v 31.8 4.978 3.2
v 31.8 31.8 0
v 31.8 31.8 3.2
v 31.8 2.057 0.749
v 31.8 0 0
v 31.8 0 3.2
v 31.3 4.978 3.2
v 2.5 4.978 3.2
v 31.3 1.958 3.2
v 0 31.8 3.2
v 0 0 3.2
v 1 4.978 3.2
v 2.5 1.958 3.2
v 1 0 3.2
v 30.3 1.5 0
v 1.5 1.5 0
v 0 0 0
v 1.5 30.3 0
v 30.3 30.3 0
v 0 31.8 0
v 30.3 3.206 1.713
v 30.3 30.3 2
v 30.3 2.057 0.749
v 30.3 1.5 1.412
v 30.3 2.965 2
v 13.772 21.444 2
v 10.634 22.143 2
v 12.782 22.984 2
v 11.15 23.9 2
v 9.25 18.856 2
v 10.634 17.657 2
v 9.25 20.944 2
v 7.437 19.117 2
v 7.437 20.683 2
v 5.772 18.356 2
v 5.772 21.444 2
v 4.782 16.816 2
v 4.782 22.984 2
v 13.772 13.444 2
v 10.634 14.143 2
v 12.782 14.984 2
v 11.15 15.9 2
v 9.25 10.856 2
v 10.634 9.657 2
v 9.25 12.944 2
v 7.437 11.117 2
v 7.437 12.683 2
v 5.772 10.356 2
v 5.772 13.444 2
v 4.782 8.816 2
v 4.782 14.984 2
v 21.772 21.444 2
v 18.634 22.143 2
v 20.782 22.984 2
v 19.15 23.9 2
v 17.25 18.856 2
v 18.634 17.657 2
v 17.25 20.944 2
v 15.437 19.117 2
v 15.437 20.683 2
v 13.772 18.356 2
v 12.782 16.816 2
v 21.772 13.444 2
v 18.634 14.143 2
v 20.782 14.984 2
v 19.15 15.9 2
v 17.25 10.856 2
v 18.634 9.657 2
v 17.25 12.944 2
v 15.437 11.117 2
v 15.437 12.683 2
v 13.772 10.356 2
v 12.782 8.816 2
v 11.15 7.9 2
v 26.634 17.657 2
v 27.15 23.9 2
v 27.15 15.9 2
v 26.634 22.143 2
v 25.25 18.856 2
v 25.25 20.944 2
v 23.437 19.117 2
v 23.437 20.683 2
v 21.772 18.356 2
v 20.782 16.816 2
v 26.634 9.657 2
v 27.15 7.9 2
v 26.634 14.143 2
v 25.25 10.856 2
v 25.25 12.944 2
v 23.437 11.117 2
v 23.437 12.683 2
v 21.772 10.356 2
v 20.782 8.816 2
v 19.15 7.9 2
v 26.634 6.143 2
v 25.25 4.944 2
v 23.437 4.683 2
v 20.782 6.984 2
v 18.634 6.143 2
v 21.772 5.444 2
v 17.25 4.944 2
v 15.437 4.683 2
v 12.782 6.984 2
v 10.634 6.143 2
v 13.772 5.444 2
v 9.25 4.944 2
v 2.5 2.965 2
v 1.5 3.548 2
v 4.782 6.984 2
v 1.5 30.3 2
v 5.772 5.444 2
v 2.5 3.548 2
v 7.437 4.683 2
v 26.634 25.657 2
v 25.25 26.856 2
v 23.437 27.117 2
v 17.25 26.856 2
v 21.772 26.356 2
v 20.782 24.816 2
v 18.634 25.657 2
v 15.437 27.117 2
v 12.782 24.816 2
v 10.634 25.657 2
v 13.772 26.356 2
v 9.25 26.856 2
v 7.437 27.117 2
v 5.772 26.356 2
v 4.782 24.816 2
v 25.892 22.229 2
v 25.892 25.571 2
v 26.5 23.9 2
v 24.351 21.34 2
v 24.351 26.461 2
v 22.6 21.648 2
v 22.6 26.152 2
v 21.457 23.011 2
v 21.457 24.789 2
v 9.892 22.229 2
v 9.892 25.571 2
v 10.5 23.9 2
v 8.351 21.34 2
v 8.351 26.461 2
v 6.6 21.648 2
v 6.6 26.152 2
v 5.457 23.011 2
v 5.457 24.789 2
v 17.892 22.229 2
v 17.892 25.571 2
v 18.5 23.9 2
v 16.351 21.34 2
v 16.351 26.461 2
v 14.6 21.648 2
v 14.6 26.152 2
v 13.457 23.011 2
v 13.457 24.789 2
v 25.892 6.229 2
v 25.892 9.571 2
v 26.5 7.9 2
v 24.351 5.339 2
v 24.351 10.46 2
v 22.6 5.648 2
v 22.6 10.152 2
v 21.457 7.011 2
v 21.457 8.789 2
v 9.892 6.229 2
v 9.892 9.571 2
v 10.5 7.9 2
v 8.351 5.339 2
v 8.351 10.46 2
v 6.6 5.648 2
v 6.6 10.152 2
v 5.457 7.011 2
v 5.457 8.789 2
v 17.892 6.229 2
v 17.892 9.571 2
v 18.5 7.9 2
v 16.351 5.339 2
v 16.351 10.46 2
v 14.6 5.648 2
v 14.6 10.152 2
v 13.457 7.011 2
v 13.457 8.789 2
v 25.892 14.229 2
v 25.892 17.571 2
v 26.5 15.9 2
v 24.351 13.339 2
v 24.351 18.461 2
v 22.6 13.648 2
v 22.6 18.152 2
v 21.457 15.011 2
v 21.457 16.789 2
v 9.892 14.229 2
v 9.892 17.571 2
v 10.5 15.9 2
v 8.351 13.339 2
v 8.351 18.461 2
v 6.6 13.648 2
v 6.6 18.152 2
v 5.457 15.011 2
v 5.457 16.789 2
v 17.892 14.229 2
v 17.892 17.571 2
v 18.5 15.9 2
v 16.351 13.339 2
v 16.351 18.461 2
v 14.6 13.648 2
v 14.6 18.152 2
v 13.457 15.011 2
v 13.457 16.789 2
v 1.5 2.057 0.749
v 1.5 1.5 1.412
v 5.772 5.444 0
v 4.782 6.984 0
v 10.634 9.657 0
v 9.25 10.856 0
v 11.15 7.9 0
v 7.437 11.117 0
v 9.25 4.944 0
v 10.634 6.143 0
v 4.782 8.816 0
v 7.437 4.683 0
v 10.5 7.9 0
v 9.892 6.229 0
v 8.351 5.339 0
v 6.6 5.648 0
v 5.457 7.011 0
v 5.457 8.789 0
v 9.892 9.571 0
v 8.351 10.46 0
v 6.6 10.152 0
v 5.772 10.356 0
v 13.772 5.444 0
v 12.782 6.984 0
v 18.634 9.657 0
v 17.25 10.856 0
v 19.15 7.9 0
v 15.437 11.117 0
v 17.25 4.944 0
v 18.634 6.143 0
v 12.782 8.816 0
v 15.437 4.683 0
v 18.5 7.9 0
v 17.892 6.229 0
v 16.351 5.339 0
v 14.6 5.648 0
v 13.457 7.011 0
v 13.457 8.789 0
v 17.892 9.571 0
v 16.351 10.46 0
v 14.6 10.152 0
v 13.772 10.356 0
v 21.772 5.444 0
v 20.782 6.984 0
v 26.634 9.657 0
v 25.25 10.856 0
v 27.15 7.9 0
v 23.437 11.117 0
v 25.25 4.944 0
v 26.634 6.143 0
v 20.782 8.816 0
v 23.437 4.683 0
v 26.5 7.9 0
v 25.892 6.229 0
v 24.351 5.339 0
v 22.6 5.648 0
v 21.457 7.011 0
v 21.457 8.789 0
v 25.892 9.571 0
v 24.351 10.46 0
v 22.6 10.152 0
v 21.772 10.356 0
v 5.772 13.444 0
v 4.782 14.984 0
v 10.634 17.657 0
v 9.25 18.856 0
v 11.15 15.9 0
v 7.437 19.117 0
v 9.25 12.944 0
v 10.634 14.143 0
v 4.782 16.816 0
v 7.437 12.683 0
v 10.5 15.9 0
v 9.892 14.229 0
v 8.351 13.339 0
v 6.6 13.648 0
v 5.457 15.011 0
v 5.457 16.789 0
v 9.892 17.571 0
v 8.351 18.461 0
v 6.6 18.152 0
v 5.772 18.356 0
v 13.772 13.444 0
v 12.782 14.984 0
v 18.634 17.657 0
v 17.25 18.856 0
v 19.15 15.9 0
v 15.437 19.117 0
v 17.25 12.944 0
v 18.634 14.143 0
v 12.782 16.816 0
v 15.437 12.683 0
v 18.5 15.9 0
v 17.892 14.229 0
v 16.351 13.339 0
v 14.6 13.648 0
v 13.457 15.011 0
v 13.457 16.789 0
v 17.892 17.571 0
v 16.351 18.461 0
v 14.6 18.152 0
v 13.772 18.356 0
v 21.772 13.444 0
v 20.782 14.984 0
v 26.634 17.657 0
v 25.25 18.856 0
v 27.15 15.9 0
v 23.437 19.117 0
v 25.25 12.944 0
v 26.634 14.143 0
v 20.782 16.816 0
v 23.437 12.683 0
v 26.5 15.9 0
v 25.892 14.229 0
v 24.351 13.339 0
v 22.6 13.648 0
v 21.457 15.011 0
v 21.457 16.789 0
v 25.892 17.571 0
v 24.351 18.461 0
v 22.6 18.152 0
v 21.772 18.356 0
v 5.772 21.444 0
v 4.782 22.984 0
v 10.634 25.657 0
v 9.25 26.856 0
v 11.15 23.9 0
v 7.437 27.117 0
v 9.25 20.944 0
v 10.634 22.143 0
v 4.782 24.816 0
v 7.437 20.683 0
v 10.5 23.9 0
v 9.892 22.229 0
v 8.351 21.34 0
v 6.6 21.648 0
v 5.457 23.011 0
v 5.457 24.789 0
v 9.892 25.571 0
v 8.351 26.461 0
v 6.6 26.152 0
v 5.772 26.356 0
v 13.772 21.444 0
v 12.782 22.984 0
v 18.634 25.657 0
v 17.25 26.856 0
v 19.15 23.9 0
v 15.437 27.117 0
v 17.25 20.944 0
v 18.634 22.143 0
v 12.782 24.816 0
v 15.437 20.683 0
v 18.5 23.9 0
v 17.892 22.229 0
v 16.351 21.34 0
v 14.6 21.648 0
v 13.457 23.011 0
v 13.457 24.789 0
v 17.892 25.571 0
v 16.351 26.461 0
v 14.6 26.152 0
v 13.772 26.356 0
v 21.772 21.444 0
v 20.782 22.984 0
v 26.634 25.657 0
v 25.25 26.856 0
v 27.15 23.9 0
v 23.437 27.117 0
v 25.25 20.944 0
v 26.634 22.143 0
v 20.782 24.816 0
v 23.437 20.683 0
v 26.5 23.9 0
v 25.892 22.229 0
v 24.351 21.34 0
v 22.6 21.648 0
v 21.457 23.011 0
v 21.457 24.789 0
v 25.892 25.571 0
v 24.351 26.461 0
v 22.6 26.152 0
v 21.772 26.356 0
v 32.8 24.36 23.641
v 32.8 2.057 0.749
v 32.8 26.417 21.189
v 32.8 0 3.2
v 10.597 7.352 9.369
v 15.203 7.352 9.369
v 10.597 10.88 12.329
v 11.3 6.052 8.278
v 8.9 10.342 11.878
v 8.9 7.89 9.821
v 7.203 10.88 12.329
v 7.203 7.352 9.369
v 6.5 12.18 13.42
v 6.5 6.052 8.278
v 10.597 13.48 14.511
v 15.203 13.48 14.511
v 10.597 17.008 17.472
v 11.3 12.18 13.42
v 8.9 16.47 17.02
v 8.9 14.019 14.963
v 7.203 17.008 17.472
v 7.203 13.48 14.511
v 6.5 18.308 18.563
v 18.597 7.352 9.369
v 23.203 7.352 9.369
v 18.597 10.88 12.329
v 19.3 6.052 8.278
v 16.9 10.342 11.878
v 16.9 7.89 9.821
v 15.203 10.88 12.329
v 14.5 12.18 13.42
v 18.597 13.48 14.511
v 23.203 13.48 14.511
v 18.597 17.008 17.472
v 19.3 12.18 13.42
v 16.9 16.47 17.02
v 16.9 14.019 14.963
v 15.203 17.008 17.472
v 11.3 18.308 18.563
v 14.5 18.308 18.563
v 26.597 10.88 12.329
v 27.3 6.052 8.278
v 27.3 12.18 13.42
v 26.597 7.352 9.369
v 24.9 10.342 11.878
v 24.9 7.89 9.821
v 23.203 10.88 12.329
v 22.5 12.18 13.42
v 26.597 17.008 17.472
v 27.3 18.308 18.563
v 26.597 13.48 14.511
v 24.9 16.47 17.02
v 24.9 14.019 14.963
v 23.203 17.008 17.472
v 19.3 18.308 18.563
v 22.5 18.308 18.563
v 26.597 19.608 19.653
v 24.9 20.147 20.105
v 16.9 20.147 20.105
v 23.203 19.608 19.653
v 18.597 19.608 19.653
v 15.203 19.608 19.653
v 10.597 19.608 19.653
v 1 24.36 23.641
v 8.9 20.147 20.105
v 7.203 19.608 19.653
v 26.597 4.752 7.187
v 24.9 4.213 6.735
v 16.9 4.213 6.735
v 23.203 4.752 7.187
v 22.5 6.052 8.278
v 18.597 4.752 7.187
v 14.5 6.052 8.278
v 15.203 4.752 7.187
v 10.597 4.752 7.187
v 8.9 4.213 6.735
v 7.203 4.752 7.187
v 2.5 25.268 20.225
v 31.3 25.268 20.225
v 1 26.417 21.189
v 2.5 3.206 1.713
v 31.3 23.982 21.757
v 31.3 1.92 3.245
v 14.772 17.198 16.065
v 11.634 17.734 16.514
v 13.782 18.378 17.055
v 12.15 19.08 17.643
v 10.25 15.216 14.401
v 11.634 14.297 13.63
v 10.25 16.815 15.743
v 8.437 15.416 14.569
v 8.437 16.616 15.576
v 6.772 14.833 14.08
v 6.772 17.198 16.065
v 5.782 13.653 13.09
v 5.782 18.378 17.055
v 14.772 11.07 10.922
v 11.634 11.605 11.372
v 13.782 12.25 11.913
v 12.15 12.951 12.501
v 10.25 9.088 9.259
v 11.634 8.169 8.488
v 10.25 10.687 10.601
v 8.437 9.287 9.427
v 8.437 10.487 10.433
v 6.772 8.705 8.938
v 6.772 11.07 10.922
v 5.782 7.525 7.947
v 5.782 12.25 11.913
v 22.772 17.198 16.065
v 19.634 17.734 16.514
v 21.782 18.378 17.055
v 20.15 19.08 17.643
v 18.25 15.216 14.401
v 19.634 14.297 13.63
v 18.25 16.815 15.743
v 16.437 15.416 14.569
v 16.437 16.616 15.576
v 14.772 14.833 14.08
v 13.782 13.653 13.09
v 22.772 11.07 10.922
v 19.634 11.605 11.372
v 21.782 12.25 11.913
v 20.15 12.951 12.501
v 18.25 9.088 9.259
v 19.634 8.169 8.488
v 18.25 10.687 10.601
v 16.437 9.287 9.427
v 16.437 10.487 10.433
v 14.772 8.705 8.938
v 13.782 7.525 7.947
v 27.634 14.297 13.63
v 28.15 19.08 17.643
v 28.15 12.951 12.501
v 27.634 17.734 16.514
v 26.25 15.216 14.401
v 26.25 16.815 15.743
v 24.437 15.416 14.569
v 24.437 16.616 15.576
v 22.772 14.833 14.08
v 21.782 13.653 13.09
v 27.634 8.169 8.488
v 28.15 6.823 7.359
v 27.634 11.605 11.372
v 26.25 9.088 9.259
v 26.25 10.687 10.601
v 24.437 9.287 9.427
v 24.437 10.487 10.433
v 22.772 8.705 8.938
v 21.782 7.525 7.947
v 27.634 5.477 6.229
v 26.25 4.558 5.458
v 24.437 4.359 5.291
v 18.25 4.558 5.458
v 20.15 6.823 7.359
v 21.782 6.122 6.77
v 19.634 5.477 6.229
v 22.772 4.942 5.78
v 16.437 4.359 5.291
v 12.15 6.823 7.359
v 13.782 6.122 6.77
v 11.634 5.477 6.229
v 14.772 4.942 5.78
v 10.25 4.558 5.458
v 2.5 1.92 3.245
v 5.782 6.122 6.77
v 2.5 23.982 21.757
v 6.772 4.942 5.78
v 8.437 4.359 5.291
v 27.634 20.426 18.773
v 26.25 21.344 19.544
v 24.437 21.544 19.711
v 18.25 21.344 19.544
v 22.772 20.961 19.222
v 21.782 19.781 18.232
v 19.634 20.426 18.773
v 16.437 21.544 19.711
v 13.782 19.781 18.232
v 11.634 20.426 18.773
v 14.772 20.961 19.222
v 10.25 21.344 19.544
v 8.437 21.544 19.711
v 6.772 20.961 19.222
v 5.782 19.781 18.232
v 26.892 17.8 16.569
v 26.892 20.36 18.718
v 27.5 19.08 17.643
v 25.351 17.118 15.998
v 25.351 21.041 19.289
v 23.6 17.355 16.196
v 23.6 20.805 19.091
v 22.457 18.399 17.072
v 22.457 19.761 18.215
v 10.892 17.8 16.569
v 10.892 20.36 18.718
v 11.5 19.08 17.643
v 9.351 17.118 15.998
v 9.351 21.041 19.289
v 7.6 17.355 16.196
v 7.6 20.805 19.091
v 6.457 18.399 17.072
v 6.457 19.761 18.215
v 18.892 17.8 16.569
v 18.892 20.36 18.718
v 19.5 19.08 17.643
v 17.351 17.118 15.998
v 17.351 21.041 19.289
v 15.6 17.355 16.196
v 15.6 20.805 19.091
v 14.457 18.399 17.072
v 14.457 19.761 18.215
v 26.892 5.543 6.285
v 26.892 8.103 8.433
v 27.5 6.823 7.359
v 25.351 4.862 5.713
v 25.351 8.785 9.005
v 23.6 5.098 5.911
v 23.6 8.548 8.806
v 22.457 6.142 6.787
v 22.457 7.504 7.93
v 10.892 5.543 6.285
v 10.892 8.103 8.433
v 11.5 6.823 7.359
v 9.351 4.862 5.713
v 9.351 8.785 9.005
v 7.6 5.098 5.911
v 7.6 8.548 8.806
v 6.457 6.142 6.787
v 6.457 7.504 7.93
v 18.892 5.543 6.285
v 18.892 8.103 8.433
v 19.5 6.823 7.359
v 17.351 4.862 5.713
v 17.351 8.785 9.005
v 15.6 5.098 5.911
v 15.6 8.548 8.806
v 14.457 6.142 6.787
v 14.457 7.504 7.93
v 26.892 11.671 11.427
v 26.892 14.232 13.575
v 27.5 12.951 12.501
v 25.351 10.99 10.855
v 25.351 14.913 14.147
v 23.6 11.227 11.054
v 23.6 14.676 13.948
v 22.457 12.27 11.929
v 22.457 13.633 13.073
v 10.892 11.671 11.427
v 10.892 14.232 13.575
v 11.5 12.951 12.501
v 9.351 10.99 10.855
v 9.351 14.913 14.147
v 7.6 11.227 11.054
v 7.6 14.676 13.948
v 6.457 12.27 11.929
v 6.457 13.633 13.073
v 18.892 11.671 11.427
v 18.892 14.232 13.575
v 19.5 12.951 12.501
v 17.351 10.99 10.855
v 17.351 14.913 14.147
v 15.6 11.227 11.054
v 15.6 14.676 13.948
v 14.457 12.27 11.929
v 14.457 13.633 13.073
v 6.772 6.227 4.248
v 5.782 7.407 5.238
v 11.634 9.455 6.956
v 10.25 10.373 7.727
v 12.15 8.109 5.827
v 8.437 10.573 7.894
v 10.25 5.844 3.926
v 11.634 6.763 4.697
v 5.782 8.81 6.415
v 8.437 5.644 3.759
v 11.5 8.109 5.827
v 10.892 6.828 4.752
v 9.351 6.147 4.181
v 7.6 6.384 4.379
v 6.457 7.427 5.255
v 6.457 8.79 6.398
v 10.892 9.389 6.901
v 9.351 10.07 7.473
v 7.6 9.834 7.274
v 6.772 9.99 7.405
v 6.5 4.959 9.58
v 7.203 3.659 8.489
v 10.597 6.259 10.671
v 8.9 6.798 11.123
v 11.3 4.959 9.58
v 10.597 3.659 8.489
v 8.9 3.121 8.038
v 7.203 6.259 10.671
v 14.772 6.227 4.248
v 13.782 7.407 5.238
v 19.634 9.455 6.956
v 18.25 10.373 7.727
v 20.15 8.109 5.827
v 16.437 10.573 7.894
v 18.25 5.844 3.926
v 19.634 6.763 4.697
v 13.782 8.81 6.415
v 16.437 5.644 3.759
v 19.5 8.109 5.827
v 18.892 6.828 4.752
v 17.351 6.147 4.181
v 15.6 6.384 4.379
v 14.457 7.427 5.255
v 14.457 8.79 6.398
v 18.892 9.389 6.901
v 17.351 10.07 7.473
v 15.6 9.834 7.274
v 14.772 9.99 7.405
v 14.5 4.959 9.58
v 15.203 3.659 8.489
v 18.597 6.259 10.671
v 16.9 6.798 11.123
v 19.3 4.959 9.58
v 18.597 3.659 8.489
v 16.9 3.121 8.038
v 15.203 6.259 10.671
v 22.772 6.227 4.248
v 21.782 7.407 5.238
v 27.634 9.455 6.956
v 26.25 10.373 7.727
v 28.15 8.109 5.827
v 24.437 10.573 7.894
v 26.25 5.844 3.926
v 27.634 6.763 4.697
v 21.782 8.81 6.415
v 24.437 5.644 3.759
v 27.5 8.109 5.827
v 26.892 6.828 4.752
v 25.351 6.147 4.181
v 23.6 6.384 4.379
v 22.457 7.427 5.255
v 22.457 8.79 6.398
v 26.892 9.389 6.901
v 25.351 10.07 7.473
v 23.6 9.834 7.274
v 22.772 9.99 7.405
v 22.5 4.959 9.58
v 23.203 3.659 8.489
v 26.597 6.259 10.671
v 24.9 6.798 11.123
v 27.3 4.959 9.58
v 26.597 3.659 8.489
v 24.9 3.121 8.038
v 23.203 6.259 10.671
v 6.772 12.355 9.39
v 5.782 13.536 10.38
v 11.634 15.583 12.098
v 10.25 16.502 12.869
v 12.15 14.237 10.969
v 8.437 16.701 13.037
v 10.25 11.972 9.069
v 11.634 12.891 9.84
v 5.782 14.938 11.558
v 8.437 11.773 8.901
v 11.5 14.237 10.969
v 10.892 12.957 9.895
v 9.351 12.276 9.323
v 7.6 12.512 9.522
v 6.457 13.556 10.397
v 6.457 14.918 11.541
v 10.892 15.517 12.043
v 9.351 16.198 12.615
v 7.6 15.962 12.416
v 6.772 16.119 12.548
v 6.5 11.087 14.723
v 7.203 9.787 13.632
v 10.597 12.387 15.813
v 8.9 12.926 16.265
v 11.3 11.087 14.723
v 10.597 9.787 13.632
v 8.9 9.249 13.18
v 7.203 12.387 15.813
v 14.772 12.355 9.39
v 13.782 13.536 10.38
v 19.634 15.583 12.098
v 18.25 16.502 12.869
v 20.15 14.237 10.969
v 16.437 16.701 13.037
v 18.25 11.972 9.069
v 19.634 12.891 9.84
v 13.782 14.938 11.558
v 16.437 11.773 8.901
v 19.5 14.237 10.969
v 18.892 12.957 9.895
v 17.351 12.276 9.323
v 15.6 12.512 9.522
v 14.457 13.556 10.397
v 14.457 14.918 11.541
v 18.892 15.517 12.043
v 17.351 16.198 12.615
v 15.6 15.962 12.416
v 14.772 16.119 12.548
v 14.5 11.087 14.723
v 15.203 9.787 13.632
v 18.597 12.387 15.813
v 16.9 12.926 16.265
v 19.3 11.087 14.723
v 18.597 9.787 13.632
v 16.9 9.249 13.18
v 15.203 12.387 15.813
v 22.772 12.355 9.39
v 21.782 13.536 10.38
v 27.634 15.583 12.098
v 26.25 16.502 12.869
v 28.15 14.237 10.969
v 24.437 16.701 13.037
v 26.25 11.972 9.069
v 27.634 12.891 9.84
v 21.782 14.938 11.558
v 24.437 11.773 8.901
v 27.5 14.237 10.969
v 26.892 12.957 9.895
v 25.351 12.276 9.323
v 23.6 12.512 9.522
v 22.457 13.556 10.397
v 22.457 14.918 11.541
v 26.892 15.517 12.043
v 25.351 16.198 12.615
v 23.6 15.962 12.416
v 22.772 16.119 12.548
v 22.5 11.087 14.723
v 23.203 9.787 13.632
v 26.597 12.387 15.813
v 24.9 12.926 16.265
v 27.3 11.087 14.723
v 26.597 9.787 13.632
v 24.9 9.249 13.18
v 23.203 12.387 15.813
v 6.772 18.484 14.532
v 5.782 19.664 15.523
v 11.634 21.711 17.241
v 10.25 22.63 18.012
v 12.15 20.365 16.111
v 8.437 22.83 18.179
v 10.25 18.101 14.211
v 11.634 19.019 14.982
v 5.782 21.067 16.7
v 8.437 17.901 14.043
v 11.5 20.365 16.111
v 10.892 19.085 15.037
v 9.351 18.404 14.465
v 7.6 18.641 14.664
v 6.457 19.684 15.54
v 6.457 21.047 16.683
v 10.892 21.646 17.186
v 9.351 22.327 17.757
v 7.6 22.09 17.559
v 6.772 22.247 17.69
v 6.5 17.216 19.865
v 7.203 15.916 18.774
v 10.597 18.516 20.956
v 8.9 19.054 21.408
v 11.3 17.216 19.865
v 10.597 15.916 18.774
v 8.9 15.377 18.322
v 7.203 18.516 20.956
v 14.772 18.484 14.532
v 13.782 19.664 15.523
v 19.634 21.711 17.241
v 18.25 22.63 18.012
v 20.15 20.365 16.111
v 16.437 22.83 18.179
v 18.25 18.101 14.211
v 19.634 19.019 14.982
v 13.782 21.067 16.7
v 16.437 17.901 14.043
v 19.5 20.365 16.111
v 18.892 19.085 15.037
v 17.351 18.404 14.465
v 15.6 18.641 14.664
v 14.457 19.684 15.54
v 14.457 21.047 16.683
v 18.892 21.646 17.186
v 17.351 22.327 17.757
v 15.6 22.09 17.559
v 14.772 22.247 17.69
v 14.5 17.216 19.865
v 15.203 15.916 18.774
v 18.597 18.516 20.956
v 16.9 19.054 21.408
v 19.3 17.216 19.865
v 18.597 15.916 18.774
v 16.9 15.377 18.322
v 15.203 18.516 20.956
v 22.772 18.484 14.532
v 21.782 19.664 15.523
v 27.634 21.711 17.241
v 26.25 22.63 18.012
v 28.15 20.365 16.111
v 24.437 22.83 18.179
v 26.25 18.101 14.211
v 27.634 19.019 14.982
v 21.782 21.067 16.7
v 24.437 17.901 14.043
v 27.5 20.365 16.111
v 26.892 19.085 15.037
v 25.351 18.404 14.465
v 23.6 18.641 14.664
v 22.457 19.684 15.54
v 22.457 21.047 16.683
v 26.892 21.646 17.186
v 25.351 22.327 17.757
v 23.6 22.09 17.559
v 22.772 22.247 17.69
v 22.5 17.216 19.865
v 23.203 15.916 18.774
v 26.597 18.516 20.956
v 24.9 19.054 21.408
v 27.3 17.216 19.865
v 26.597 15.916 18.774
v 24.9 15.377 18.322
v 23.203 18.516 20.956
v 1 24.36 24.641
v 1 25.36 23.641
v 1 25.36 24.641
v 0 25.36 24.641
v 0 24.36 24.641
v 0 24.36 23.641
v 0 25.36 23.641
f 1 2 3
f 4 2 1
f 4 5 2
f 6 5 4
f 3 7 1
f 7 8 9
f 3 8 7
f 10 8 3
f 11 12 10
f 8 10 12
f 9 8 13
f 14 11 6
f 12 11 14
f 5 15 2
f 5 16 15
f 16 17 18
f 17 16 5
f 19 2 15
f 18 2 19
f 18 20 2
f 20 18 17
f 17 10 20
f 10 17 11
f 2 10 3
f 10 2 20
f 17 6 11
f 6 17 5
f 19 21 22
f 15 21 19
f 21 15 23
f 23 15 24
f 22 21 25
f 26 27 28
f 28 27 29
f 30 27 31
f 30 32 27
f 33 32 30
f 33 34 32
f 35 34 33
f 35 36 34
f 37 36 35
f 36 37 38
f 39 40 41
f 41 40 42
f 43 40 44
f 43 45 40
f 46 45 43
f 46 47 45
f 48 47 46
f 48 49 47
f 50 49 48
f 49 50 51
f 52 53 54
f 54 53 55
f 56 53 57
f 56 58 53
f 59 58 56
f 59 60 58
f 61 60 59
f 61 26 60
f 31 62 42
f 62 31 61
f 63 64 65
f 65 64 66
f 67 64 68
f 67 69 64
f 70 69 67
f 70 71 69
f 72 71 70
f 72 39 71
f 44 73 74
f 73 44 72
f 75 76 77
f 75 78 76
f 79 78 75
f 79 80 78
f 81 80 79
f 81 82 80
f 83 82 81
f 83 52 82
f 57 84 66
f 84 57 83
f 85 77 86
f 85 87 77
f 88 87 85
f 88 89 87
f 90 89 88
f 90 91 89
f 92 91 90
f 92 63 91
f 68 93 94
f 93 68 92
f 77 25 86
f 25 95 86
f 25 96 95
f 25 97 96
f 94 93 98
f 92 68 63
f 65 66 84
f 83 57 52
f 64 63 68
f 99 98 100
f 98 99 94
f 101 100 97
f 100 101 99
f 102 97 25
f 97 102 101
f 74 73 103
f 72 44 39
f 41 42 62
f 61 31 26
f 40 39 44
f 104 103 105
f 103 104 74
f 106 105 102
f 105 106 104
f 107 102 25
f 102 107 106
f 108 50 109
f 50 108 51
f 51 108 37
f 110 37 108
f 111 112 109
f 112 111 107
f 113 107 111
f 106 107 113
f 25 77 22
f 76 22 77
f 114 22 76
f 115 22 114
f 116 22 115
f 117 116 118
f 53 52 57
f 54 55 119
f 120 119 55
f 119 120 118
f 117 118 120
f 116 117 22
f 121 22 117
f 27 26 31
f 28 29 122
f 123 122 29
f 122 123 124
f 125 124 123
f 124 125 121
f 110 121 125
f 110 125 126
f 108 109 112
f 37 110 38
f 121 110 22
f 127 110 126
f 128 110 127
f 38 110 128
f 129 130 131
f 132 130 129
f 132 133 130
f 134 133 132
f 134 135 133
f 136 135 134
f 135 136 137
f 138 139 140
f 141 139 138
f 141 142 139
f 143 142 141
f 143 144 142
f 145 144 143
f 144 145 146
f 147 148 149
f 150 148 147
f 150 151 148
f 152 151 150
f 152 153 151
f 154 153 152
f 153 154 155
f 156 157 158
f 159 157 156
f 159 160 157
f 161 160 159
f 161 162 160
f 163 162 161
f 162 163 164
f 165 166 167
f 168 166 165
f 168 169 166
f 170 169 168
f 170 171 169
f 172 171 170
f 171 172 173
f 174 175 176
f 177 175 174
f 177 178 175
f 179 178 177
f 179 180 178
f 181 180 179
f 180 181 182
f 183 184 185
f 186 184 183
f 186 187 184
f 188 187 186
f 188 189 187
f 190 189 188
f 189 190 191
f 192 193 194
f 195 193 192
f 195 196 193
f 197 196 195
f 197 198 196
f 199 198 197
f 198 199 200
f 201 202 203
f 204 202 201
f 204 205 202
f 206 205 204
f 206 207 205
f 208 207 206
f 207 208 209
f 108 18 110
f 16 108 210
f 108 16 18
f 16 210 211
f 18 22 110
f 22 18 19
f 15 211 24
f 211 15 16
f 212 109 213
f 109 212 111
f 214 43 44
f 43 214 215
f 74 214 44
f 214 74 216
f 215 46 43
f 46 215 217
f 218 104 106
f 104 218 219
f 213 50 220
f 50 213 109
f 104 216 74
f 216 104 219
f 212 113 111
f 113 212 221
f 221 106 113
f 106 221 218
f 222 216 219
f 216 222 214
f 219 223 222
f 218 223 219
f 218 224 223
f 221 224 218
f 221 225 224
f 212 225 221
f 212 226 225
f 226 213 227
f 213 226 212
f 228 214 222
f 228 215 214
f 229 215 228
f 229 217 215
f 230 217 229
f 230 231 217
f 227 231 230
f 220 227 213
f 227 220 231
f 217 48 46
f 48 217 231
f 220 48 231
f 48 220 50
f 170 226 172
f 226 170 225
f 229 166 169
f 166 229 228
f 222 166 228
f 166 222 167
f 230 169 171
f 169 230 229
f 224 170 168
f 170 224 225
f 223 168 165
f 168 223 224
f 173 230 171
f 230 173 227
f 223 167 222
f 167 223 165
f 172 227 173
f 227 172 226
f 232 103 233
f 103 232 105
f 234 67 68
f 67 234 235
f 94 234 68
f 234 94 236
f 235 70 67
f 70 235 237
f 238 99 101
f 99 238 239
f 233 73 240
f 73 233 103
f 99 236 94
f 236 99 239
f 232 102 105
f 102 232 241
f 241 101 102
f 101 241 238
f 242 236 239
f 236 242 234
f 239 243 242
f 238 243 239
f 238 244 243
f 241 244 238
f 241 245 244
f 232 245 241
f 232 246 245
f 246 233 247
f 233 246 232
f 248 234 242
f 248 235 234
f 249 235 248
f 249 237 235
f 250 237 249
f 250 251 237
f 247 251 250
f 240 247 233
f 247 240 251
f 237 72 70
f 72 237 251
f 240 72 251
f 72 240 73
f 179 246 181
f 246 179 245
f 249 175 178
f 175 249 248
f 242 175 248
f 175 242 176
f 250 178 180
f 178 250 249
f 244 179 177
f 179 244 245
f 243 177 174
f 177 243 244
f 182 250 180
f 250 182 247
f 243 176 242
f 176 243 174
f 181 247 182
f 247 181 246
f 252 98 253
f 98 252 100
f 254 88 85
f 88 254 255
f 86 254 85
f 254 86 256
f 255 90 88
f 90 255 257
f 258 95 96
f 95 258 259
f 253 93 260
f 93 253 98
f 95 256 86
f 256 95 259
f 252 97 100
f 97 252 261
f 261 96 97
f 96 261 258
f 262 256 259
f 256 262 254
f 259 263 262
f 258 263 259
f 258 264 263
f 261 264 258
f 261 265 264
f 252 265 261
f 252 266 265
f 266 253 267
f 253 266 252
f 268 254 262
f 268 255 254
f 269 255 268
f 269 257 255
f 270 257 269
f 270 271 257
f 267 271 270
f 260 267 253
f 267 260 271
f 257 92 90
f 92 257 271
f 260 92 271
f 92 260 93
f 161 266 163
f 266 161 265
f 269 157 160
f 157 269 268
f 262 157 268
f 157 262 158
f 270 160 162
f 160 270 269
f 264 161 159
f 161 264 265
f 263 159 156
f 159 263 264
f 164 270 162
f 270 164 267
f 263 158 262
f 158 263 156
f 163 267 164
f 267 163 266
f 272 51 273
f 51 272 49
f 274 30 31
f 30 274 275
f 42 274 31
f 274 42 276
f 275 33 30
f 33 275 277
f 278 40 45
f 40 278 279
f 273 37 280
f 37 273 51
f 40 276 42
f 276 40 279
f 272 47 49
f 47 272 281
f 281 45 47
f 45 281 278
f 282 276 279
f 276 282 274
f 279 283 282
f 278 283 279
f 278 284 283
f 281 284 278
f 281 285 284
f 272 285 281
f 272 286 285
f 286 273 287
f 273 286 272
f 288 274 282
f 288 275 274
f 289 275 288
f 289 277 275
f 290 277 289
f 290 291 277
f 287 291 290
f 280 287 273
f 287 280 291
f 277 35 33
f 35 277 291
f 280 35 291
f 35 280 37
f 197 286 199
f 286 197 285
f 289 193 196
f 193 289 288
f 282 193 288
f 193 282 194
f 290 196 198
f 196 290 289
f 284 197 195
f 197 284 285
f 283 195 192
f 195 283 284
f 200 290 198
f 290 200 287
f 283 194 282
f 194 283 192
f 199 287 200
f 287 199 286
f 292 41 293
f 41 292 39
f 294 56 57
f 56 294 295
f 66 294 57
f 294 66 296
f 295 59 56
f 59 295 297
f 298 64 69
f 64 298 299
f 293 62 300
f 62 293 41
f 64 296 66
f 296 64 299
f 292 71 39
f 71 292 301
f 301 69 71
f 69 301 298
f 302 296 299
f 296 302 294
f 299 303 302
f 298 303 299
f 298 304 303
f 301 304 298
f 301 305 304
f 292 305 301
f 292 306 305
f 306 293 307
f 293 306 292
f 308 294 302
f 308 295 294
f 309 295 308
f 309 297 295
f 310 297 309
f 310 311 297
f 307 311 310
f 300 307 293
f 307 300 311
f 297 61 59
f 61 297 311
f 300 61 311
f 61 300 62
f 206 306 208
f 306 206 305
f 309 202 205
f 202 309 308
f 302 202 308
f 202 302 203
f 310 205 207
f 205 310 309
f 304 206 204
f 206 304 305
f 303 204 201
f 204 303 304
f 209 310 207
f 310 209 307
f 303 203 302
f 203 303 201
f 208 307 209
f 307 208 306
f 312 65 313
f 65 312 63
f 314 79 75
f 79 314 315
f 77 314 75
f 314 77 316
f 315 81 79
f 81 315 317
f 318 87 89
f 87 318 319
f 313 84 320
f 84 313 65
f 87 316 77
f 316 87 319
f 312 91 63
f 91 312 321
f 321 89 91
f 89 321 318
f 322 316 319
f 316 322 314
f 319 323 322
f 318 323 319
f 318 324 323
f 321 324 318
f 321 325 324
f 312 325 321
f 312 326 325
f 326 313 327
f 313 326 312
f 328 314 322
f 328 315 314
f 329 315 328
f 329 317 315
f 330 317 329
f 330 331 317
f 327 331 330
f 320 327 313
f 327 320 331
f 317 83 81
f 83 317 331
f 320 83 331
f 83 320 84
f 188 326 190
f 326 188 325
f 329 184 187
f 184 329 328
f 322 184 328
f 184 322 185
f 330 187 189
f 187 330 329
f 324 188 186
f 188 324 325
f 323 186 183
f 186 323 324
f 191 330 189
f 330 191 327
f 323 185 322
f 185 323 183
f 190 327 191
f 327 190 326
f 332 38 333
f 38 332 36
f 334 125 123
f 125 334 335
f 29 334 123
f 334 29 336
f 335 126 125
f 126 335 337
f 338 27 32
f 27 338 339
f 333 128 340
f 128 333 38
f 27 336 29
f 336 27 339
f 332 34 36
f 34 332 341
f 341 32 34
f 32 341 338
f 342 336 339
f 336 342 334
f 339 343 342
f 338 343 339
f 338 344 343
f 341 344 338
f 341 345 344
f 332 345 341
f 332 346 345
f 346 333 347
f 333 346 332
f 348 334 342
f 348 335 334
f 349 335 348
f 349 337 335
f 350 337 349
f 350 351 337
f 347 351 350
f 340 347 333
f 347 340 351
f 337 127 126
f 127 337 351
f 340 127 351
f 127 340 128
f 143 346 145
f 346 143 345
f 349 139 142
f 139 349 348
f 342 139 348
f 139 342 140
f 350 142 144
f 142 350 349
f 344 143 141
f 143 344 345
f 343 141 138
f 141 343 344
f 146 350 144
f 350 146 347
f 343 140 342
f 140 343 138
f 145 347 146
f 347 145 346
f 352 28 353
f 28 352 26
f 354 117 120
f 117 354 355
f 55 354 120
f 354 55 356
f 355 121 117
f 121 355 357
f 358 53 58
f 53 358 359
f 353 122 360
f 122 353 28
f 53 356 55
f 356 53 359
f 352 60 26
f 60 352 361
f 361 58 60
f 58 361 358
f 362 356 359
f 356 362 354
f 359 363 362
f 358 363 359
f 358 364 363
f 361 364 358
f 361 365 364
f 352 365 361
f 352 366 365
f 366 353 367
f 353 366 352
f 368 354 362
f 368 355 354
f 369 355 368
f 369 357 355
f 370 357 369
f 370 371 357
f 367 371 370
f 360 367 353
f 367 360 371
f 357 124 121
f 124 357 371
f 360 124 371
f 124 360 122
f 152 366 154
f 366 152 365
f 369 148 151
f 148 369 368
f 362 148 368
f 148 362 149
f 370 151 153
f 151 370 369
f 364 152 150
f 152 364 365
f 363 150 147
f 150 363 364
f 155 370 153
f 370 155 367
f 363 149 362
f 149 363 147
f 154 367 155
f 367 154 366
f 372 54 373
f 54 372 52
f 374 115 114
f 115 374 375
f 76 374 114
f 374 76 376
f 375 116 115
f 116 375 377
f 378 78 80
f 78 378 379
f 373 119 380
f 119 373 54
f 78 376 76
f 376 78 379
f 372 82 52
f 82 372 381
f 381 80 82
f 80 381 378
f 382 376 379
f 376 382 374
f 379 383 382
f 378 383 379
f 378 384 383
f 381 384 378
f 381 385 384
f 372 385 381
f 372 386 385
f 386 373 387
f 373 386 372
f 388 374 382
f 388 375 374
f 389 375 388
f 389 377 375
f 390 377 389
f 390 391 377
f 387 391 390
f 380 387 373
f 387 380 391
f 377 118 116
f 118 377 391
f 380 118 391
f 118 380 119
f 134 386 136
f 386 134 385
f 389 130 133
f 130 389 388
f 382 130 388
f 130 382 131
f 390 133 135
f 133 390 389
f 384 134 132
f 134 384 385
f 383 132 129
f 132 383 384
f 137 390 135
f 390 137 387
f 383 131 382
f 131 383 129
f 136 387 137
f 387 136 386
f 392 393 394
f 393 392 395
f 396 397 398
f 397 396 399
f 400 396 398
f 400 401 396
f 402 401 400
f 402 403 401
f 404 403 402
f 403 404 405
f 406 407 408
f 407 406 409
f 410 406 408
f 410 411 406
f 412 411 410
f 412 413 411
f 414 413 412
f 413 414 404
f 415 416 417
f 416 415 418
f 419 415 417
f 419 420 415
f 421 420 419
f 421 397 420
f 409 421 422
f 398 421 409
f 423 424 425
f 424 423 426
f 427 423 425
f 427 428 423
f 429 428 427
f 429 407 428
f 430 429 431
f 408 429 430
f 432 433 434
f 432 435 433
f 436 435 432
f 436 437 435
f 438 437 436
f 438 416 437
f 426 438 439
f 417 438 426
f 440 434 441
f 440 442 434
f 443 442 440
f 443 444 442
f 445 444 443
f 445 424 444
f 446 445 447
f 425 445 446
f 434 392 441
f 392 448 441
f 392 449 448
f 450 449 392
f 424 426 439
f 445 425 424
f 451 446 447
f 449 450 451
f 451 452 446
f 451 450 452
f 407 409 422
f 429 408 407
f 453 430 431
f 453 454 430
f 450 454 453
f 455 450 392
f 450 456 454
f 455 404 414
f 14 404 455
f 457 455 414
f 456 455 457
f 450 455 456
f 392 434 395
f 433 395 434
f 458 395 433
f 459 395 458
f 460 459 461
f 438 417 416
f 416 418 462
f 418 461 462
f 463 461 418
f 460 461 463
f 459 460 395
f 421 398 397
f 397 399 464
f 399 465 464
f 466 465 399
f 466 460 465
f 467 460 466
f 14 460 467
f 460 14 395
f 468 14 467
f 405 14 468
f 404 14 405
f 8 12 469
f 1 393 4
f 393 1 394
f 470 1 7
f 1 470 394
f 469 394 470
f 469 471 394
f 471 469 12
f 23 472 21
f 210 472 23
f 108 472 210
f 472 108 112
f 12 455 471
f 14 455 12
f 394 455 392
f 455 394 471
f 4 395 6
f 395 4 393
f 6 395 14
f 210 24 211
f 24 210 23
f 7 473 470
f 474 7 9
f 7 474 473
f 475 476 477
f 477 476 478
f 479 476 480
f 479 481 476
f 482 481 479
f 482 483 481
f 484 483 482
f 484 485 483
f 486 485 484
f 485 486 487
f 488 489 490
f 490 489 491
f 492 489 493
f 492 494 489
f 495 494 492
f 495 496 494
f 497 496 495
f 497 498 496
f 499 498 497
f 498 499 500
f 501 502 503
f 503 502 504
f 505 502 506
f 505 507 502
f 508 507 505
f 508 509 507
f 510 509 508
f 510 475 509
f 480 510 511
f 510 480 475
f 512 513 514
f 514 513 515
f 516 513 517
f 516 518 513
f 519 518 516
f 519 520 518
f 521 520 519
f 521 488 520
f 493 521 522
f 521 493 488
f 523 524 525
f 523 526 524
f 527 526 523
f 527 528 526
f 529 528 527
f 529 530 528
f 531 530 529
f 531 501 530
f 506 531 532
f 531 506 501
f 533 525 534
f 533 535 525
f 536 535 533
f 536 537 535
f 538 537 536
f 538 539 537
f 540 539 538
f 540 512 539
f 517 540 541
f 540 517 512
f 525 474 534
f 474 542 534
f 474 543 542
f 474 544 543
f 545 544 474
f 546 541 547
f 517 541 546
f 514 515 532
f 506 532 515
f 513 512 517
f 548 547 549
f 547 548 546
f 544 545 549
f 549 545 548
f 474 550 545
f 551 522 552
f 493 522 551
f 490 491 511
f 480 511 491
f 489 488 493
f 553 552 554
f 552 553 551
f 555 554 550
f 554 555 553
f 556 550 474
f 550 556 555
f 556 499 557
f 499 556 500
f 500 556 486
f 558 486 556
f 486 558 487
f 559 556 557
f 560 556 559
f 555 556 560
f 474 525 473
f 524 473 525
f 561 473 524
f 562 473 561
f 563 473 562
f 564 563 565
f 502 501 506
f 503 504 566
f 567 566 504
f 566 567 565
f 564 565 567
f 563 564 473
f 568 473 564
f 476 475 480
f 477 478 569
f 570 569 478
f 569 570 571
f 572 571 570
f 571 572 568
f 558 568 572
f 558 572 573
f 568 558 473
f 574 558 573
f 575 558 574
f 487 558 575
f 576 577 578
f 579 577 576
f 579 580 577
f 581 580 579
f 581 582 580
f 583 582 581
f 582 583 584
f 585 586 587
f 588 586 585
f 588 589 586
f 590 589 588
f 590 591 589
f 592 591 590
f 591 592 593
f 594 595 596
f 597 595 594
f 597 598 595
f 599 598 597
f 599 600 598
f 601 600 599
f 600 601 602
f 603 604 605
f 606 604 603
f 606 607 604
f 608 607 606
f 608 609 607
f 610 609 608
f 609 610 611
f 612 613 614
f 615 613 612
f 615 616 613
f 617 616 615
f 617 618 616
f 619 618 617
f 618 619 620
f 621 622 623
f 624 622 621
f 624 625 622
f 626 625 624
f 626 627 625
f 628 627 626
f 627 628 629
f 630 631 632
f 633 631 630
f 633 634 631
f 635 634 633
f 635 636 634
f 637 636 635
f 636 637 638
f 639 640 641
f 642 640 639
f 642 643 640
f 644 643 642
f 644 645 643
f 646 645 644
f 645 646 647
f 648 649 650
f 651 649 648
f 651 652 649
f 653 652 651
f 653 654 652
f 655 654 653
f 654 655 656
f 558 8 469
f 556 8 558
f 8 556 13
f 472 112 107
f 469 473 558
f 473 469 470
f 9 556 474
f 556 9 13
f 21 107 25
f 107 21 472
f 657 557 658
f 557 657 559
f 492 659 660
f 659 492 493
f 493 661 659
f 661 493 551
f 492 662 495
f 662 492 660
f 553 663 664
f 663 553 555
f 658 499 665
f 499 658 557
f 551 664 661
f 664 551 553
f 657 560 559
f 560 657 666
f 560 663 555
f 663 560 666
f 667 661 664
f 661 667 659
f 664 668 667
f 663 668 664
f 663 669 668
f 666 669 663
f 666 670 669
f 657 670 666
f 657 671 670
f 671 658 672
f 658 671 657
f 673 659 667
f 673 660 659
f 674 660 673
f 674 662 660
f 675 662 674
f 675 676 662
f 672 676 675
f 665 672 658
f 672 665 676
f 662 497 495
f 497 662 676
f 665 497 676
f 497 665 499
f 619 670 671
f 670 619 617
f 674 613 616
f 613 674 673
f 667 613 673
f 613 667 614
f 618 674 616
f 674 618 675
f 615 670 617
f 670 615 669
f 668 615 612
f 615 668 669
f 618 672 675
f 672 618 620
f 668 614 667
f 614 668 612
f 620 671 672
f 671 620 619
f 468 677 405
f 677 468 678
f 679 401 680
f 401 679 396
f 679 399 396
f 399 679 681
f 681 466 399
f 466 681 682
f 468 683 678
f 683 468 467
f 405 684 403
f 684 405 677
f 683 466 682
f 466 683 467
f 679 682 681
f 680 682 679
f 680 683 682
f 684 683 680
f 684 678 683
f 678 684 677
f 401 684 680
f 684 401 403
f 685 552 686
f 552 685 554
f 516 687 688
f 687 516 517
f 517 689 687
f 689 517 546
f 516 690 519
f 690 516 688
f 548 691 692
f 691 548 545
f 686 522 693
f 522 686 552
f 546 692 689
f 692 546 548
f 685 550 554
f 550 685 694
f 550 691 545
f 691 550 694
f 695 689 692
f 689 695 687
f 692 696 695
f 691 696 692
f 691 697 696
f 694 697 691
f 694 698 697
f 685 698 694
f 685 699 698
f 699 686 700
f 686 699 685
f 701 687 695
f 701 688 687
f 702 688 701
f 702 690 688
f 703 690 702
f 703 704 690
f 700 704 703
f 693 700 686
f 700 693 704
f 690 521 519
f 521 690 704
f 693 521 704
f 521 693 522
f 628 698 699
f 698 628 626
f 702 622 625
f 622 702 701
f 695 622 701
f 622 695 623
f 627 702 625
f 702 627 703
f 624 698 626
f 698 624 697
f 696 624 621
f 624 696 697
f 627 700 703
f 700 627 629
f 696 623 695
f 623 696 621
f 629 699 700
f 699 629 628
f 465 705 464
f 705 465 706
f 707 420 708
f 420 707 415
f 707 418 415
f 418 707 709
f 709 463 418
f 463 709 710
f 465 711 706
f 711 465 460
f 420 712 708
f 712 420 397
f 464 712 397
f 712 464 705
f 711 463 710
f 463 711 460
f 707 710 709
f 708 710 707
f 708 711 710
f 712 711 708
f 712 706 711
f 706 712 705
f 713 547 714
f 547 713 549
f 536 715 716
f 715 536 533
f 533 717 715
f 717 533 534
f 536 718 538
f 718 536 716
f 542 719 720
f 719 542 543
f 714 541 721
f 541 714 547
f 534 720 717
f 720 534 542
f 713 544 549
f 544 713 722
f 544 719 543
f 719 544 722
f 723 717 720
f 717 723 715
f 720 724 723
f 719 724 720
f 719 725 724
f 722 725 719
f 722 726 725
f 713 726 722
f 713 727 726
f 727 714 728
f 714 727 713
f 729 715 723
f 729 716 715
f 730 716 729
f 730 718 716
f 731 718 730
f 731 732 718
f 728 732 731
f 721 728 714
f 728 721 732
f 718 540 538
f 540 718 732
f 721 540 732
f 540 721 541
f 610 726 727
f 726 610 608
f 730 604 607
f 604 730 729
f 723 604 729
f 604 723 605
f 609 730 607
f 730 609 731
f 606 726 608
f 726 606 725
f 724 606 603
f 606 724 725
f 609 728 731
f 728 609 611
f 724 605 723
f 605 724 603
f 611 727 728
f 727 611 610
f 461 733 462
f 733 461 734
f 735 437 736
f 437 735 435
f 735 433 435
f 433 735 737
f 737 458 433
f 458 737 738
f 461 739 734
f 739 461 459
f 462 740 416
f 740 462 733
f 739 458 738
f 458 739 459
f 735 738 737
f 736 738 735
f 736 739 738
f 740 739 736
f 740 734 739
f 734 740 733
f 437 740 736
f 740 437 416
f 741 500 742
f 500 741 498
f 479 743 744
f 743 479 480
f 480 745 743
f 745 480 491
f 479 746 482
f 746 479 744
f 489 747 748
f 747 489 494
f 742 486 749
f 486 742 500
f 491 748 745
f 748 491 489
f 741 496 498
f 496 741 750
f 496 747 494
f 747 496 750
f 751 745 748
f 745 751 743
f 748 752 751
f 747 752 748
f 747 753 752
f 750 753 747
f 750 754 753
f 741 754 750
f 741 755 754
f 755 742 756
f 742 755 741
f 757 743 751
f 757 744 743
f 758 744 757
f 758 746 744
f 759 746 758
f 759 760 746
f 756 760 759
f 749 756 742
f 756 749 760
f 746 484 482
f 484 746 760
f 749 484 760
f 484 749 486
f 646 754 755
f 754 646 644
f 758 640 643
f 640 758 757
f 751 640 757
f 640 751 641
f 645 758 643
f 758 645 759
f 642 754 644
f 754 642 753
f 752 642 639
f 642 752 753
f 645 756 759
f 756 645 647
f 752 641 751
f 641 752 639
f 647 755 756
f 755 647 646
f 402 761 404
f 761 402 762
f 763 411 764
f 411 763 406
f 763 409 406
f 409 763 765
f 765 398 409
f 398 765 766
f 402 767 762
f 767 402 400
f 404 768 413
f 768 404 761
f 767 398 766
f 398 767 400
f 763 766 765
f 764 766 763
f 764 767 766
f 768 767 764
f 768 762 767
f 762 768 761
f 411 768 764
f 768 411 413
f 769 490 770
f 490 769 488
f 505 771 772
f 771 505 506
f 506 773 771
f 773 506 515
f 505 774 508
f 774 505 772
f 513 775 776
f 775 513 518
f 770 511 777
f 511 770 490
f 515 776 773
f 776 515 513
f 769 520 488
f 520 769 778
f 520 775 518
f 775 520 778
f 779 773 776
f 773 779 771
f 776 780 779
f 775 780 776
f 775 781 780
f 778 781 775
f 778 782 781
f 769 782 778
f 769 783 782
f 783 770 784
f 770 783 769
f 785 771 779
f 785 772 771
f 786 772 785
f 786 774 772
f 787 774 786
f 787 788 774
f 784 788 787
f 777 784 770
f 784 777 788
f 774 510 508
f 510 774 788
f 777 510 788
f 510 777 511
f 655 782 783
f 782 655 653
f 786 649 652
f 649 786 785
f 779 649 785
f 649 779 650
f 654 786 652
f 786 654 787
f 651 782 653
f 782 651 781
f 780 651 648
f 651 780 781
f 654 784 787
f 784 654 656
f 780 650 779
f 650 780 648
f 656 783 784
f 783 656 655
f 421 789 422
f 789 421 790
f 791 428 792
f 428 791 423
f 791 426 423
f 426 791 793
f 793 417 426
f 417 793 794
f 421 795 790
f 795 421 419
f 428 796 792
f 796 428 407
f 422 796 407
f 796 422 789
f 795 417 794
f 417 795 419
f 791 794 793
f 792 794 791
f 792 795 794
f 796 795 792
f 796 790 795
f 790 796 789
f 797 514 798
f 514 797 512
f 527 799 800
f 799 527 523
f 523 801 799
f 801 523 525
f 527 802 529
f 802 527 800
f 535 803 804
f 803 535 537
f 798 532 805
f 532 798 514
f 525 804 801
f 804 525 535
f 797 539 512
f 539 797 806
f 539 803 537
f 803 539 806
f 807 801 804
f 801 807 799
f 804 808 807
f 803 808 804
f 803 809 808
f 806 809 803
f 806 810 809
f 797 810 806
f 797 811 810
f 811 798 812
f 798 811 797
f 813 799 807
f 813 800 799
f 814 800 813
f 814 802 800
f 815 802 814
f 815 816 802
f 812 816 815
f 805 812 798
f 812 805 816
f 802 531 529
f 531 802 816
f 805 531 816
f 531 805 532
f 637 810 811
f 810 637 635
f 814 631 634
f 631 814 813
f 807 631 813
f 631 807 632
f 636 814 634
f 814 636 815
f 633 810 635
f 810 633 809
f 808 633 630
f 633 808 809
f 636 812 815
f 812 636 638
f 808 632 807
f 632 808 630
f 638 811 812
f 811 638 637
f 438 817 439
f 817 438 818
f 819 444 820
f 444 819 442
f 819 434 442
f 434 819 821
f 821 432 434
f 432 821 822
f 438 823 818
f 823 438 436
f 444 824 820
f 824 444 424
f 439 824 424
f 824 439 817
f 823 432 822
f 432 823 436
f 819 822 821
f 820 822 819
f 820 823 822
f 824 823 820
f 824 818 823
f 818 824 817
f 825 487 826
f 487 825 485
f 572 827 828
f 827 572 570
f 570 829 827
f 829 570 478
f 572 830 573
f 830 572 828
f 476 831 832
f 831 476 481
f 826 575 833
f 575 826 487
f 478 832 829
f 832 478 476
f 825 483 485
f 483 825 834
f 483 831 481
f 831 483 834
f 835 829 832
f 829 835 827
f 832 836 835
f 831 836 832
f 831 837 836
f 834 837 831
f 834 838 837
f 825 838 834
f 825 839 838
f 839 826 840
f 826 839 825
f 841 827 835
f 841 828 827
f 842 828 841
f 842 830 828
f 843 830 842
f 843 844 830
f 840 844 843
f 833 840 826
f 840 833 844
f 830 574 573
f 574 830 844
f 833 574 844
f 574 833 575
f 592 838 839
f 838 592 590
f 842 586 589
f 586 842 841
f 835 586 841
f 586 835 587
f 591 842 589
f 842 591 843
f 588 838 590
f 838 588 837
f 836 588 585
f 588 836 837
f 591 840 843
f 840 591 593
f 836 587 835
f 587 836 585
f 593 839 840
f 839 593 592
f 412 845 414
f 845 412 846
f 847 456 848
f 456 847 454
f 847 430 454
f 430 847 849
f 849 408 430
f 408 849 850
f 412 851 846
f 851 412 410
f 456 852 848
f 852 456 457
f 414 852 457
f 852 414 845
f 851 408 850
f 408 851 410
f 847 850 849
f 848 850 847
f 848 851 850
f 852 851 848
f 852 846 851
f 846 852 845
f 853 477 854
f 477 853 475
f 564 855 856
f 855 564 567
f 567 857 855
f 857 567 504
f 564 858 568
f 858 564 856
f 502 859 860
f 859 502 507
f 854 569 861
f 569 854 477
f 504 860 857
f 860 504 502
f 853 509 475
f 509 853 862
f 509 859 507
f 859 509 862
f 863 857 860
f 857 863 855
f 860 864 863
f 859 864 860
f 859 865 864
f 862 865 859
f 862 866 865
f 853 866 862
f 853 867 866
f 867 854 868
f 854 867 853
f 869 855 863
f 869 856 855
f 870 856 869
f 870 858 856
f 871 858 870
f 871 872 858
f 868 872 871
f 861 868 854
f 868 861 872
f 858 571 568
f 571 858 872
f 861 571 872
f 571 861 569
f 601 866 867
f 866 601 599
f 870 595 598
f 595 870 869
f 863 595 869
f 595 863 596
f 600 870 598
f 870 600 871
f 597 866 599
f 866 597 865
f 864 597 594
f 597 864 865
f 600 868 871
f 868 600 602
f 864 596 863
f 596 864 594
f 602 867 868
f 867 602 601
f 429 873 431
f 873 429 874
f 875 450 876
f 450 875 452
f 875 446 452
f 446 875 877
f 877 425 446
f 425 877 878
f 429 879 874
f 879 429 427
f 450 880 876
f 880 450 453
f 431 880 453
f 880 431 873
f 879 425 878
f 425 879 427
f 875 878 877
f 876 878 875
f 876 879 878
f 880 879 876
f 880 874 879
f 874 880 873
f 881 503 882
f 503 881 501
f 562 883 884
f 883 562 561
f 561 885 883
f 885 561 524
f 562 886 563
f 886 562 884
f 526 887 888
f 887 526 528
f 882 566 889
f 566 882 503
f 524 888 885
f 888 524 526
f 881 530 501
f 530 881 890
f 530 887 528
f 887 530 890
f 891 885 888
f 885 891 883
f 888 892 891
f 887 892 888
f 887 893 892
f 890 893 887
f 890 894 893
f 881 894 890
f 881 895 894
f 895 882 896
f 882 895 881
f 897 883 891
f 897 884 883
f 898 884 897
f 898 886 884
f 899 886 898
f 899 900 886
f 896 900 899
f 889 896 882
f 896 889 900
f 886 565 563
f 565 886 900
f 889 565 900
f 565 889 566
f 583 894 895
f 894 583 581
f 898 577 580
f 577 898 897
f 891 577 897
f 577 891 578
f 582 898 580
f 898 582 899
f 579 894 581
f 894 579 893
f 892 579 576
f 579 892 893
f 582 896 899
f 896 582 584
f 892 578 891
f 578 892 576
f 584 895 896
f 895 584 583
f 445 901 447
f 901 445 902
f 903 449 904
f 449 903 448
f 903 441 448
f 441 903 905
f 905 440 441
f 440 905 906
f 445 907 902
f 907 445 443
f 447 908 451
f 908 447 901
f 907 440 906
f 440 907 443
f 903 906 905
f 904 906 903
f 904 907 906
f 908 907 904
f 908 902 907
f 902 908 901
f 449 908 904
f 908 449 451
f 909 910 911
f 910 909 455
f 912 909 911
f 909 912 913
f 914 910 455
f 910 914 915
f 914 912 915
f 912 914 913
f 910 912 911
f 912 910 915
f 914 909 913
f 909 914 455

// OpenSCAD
// file: xx_SharedStuff.scad
///////////////////////////////////////////////////////////////
// Part of the "Brick compatible color shelf" (BCCS) project //
// File: xx_SharedStuff.scad                                 //
//                                                           //
// By: Alexander Szymanski / 18thAngel                       //
///////////////////////////////////////////////////////////////

///////////////
// Functions //
///////////////
// Calculates the real val for [Width] and [Depth] to ensure the compatiblity to brick systems, by a given size
function CalcRealSize(currentSize, unitSize = 8, roundToEven = false) = ((ceil(currentSize/unitSize) + (roundToEven?( ceil(currentSize/unitSize)%2 ):0)) * unitSize) - Clearance_of_a_Brick;

// Calculates the real val for [Width] and [Depth] to ensure the compatiblity to brick systems, by a given amount of units
function GetSizeByBrickUnits(numOfUnits, unitSize = 8) = CalcRealSize(numOfUnits * unitSize, unitSize, false);

// simple prevent function for div by 0. obsolete, technicaly wrong!
function NotZero(number) = number == 0 ? 1: number;

// Calc the translation of a point after it has been rotated
function CalcTanslationAfterRotation(point, angle) = [
    point[0],
    - (point[1] * cos(angle) - point[2] * sin(angle)),
    (point[2]- (point[1] * sin(angle) + point[2] * cos(angle)))
];
// Calc the translation of a point after it has been rotated
function CalcPositionAfterRotation(point, angle) = [
    point[0],
    (point[1] * cos(angle) - point[2] * sin(angle)),
    ( (point[1] * sin(angle) + point[2] * cos(angle)))
];

/////////////
// Modules //
/////////////

//generates a base by given values
module Base(unitsWidth=4,unitsDepth=2,layersHeight=1,addHeads=false) {
  _width = GetSizeByBrickUnits(unitsWidth, Size_of_a_BrickUnit);
  _depth = GetSizeByBrickUnits(unitsDepth, Size_of_a_BrickUnit);
  _height = layersHeight * SmallHeight_of_a_Brick;
  difference() {
    cube([ _width, _depth, _height ]);
    translate([
      OutterWallStrength_of_a_Brick, OutterWallStrength_of_a_Brick, -
      TopWallStrength_of_a_Brick
    ])
        cube([
          _width - 2 * OutterWallStrength_of_a_Brick,
          _depth - 2 * OutterWallStrength_of_a_Brick,
          _height
        ]);
  }
  color("red") 
  for (row = [1:1:unitsDepth - 1]) {
    for (col = [1:1:unitsWidth - 1]) {
        _x = Size_of_a_BrickUnit * col - Clearance_of_a_Brick/2;
        _y = Size_of_a_BrickUnit * row - Clearance_of_a_Brick/2;
        translate([_x, _y, 0 ])
        {
            SingleBrickInlay();
            if(addHeads)
            {
                translate([0, 0, _height])
                    cylinder(Height_of_a_BrickHead,Diameter_of_a_BrickHead/2,Diameter_of_a_BrickHead/2);
            }
        }
    }
  }
}


module SingleBrickInlay(layersHeight=1) {
   _height = layersHeight * SmallHeight_of_a_Brick;
  difference() {
    cylinder(_height - TopWallStrength_of_a_Brick,
             OutterRadius_of_a_BrickHole, OutterRadius_of_a_BrickHole);
    cylinder(_height - TopWallStrength_of_a_Brick,
             InnerRadius_of_a_BrickHole, InnerRadius_of_a_BrickHole);
  }
}
// file: xx_Constants.scad
///////////////////////////////////////////////////////////////
// Part of the "Brick compatible color shelf" (BCCS) project //
// File: xx_Constants.scad                                   //
//                                                           //
// By: Alexander Szymanski / 18thAngel                       //
///////////////////////////////////////////////////////////////

// This file generates all important values that are needed to be compatible with most
// modual brick systems.
// The core values have been take from Wikipedia article as of 2024-10-05:
// - https://en.wikipedia.org/wiki/Lego#Design
// - https://en.wikipedia.org/wiki/Lego#/media/File:Lego_dimensions.svg
// some might have been slightly modified to match printers offset


/*[Hidden]*/
///////////////////////
///////////////////////
//// Brick Related ////
///////////////////////
///////////////////////

// as found in Wiki
SmallHeight_of_a_Brick = 3.2; 

// as found in Wiki
Height_of_a_BrickHead = 1.7;

// as found in Wiki
Diameter_of_a_BrickHead = 4.8;

// as found in Wiki
Clearance_of_a_Brick = 0.2;

// messured from a brick on my desk
InnerWallStrength_of_a_Brick = 0.85;

// assumed
TopWallStrength_of_a_Brick = 1.2;

//////////////////////////
// Precalculated Values //
//////////////////////////

// A brick can be cutted in three parts / layers 
// and is allowed to be any non decimal multiplication of that layer height
// Original the normal brick is SmallHeight_of_a_Brick * 3;
Height_of_a_Brick = SmallHeight_of_a_Brick * 3;

// Values, that are related to width and depth of a brick are fixed to brick units
// 1 brick unit is calculated by SmallHeight_of_a_Brick * 2.5;
// Values [Width] and [Depth] of a brick must match a non decimal multiplication of a brick unit
Size_of_a_BrickUnit = SmallHeight_of_a_Brick * 2.5;

// Value that is used for any outter walls regarding [Width] and [Depth], most likely it could also be used for height
// Calculation:
// ([Size of a single brick unit] - [clearance of a brick] - [diameter of a brick head]) / 2
OutterWallStrength_of_a_Brick = (Size_of_a_BrickUnit - Clearance_of_a_Brick - Diameter_of_a_BrickHead) / 2;

// For better fitting, the total [Width] and [Depth] of a brick will be lowered by 0.2 mm
// that helps to stack those bricks, or tear them apart
Width_of_a_Brick = Size_of_a_BrickUnit - Clearance_of_a_Brick;

// Simple Diameter => Radius calc
Radius_of_a_BrickHead = Diameter_of_a_BrickHead / 2;

// According to the Specs, it should be +0.1,
// as it doubles up when we convert it back to a radius
// but in this case it did not worked with my printer! 
// this value will be substracted (difference) from [OutterRadius_of_a_BrickHole]
InnerRadius_of_a_BrickHole = Radius_of_a_BrickHead + 0.2;

// Size of a brickhead increased the strength of inner walls
OutterRadius_of_a_BrickHole = Radius_of_a_BrickHead + InnerWallStrength_of_a_Brick;

// Thickness used for the [Thickness:Z] of the tile base. For Historical Reasons!
Thickness_of_tile_base = SmallHeight_of_a_Brick;

////////////////////////
////////////////////////
//// Bottle Related ////
////////////////////////
////////////////////////

////////////////////
// Bottle_presets //
////////////////////
_v_diameter = 25;
_gb26_diameter = 26;
_gb30_diameter = 30;
_gb32_diameter = 32;
_gb35_diameter = 35;
_gb37_diameter = 37;


// Not a const, i know! 
// returns the Diameter for the given string
function GetBottleDiameter(bottleType,userDefindedBottleDiameter) = 
  bottleType=="v" ? _v_diameter
: bottleType=="gb26" ? _gb26_diameter
: bottleType=="gb30" ? _gb30_diameter
: bottleType=="gb32" ? _gb32_diameter
: bottleType=="gb35" ? _gb35_diameter
: bottleType=="gb37" ? _gb37_diameter
:userDefindedBottleDiameter;
// main file
///////////////////////////////////////////////////////////////
// Part of the "Brick compatible color shelf" (BCCS) project //
// File: 02_AngleStone.scad                                  //
//                                                           //
// By: Alexander Szymanski / 18thAngel                       //
///////////////////////////////////////////////////////////////

include <xx_Constants.scad>
include <xx_SharedStuff.scad>

/*[General Settings]*/
// Used for fast rendering
Num_Of_Fragments_DebugMode = 12;

// Used for print version, more fragments resolve in LONGER rendering time but smother curves
Num_Of_Fragments_ProductMode = 72;

/*[Brick Settings]*/
// [Width] (X-Coordinate) of the brick in brick units. Must be positive, not decimal, not zero value.
BrickWidth = 4;
// [Depth] (Y-Coordinate) of the brick in brick units. Must be positive, not decimal, not zero value.
BrickDepth = 4;
// [HeightLayers used for the Base] before adding the angle. Must be positive, not decimal, not zero value.
HeightLayers = 1;

Angle = 40;

_origin_x = GetSizeByBrickUnits(BrickWidth, Size_of_a_BrickUnit);
_origin_z = SmallHeight_of_a_Brick * HeightLayers;
echo(_origin_x);
echo(_origin_z);

correctedPosition = CalcTanslationAfterRotation([0,0,_origin_z], Angle);
newEnd= CalcPositionAfterRotation([0,_origin_x,_origin_z], Angle) + correctedPosition ;
echo(correctedPosition);
echo(newEnd);
translate(newEnd) 
color("red",1) 
    cube(1);

color("yellow",0.5) 
Base(BrickWidth,BrickDepth, HeightLayers,false);
translate([1,0,0]) 
translate(correctedPosition)
    rotate([Angle,0,0])
    color("green",1) 
        Base(BrickWidth,BrickDepth, HeightLayers,true);
